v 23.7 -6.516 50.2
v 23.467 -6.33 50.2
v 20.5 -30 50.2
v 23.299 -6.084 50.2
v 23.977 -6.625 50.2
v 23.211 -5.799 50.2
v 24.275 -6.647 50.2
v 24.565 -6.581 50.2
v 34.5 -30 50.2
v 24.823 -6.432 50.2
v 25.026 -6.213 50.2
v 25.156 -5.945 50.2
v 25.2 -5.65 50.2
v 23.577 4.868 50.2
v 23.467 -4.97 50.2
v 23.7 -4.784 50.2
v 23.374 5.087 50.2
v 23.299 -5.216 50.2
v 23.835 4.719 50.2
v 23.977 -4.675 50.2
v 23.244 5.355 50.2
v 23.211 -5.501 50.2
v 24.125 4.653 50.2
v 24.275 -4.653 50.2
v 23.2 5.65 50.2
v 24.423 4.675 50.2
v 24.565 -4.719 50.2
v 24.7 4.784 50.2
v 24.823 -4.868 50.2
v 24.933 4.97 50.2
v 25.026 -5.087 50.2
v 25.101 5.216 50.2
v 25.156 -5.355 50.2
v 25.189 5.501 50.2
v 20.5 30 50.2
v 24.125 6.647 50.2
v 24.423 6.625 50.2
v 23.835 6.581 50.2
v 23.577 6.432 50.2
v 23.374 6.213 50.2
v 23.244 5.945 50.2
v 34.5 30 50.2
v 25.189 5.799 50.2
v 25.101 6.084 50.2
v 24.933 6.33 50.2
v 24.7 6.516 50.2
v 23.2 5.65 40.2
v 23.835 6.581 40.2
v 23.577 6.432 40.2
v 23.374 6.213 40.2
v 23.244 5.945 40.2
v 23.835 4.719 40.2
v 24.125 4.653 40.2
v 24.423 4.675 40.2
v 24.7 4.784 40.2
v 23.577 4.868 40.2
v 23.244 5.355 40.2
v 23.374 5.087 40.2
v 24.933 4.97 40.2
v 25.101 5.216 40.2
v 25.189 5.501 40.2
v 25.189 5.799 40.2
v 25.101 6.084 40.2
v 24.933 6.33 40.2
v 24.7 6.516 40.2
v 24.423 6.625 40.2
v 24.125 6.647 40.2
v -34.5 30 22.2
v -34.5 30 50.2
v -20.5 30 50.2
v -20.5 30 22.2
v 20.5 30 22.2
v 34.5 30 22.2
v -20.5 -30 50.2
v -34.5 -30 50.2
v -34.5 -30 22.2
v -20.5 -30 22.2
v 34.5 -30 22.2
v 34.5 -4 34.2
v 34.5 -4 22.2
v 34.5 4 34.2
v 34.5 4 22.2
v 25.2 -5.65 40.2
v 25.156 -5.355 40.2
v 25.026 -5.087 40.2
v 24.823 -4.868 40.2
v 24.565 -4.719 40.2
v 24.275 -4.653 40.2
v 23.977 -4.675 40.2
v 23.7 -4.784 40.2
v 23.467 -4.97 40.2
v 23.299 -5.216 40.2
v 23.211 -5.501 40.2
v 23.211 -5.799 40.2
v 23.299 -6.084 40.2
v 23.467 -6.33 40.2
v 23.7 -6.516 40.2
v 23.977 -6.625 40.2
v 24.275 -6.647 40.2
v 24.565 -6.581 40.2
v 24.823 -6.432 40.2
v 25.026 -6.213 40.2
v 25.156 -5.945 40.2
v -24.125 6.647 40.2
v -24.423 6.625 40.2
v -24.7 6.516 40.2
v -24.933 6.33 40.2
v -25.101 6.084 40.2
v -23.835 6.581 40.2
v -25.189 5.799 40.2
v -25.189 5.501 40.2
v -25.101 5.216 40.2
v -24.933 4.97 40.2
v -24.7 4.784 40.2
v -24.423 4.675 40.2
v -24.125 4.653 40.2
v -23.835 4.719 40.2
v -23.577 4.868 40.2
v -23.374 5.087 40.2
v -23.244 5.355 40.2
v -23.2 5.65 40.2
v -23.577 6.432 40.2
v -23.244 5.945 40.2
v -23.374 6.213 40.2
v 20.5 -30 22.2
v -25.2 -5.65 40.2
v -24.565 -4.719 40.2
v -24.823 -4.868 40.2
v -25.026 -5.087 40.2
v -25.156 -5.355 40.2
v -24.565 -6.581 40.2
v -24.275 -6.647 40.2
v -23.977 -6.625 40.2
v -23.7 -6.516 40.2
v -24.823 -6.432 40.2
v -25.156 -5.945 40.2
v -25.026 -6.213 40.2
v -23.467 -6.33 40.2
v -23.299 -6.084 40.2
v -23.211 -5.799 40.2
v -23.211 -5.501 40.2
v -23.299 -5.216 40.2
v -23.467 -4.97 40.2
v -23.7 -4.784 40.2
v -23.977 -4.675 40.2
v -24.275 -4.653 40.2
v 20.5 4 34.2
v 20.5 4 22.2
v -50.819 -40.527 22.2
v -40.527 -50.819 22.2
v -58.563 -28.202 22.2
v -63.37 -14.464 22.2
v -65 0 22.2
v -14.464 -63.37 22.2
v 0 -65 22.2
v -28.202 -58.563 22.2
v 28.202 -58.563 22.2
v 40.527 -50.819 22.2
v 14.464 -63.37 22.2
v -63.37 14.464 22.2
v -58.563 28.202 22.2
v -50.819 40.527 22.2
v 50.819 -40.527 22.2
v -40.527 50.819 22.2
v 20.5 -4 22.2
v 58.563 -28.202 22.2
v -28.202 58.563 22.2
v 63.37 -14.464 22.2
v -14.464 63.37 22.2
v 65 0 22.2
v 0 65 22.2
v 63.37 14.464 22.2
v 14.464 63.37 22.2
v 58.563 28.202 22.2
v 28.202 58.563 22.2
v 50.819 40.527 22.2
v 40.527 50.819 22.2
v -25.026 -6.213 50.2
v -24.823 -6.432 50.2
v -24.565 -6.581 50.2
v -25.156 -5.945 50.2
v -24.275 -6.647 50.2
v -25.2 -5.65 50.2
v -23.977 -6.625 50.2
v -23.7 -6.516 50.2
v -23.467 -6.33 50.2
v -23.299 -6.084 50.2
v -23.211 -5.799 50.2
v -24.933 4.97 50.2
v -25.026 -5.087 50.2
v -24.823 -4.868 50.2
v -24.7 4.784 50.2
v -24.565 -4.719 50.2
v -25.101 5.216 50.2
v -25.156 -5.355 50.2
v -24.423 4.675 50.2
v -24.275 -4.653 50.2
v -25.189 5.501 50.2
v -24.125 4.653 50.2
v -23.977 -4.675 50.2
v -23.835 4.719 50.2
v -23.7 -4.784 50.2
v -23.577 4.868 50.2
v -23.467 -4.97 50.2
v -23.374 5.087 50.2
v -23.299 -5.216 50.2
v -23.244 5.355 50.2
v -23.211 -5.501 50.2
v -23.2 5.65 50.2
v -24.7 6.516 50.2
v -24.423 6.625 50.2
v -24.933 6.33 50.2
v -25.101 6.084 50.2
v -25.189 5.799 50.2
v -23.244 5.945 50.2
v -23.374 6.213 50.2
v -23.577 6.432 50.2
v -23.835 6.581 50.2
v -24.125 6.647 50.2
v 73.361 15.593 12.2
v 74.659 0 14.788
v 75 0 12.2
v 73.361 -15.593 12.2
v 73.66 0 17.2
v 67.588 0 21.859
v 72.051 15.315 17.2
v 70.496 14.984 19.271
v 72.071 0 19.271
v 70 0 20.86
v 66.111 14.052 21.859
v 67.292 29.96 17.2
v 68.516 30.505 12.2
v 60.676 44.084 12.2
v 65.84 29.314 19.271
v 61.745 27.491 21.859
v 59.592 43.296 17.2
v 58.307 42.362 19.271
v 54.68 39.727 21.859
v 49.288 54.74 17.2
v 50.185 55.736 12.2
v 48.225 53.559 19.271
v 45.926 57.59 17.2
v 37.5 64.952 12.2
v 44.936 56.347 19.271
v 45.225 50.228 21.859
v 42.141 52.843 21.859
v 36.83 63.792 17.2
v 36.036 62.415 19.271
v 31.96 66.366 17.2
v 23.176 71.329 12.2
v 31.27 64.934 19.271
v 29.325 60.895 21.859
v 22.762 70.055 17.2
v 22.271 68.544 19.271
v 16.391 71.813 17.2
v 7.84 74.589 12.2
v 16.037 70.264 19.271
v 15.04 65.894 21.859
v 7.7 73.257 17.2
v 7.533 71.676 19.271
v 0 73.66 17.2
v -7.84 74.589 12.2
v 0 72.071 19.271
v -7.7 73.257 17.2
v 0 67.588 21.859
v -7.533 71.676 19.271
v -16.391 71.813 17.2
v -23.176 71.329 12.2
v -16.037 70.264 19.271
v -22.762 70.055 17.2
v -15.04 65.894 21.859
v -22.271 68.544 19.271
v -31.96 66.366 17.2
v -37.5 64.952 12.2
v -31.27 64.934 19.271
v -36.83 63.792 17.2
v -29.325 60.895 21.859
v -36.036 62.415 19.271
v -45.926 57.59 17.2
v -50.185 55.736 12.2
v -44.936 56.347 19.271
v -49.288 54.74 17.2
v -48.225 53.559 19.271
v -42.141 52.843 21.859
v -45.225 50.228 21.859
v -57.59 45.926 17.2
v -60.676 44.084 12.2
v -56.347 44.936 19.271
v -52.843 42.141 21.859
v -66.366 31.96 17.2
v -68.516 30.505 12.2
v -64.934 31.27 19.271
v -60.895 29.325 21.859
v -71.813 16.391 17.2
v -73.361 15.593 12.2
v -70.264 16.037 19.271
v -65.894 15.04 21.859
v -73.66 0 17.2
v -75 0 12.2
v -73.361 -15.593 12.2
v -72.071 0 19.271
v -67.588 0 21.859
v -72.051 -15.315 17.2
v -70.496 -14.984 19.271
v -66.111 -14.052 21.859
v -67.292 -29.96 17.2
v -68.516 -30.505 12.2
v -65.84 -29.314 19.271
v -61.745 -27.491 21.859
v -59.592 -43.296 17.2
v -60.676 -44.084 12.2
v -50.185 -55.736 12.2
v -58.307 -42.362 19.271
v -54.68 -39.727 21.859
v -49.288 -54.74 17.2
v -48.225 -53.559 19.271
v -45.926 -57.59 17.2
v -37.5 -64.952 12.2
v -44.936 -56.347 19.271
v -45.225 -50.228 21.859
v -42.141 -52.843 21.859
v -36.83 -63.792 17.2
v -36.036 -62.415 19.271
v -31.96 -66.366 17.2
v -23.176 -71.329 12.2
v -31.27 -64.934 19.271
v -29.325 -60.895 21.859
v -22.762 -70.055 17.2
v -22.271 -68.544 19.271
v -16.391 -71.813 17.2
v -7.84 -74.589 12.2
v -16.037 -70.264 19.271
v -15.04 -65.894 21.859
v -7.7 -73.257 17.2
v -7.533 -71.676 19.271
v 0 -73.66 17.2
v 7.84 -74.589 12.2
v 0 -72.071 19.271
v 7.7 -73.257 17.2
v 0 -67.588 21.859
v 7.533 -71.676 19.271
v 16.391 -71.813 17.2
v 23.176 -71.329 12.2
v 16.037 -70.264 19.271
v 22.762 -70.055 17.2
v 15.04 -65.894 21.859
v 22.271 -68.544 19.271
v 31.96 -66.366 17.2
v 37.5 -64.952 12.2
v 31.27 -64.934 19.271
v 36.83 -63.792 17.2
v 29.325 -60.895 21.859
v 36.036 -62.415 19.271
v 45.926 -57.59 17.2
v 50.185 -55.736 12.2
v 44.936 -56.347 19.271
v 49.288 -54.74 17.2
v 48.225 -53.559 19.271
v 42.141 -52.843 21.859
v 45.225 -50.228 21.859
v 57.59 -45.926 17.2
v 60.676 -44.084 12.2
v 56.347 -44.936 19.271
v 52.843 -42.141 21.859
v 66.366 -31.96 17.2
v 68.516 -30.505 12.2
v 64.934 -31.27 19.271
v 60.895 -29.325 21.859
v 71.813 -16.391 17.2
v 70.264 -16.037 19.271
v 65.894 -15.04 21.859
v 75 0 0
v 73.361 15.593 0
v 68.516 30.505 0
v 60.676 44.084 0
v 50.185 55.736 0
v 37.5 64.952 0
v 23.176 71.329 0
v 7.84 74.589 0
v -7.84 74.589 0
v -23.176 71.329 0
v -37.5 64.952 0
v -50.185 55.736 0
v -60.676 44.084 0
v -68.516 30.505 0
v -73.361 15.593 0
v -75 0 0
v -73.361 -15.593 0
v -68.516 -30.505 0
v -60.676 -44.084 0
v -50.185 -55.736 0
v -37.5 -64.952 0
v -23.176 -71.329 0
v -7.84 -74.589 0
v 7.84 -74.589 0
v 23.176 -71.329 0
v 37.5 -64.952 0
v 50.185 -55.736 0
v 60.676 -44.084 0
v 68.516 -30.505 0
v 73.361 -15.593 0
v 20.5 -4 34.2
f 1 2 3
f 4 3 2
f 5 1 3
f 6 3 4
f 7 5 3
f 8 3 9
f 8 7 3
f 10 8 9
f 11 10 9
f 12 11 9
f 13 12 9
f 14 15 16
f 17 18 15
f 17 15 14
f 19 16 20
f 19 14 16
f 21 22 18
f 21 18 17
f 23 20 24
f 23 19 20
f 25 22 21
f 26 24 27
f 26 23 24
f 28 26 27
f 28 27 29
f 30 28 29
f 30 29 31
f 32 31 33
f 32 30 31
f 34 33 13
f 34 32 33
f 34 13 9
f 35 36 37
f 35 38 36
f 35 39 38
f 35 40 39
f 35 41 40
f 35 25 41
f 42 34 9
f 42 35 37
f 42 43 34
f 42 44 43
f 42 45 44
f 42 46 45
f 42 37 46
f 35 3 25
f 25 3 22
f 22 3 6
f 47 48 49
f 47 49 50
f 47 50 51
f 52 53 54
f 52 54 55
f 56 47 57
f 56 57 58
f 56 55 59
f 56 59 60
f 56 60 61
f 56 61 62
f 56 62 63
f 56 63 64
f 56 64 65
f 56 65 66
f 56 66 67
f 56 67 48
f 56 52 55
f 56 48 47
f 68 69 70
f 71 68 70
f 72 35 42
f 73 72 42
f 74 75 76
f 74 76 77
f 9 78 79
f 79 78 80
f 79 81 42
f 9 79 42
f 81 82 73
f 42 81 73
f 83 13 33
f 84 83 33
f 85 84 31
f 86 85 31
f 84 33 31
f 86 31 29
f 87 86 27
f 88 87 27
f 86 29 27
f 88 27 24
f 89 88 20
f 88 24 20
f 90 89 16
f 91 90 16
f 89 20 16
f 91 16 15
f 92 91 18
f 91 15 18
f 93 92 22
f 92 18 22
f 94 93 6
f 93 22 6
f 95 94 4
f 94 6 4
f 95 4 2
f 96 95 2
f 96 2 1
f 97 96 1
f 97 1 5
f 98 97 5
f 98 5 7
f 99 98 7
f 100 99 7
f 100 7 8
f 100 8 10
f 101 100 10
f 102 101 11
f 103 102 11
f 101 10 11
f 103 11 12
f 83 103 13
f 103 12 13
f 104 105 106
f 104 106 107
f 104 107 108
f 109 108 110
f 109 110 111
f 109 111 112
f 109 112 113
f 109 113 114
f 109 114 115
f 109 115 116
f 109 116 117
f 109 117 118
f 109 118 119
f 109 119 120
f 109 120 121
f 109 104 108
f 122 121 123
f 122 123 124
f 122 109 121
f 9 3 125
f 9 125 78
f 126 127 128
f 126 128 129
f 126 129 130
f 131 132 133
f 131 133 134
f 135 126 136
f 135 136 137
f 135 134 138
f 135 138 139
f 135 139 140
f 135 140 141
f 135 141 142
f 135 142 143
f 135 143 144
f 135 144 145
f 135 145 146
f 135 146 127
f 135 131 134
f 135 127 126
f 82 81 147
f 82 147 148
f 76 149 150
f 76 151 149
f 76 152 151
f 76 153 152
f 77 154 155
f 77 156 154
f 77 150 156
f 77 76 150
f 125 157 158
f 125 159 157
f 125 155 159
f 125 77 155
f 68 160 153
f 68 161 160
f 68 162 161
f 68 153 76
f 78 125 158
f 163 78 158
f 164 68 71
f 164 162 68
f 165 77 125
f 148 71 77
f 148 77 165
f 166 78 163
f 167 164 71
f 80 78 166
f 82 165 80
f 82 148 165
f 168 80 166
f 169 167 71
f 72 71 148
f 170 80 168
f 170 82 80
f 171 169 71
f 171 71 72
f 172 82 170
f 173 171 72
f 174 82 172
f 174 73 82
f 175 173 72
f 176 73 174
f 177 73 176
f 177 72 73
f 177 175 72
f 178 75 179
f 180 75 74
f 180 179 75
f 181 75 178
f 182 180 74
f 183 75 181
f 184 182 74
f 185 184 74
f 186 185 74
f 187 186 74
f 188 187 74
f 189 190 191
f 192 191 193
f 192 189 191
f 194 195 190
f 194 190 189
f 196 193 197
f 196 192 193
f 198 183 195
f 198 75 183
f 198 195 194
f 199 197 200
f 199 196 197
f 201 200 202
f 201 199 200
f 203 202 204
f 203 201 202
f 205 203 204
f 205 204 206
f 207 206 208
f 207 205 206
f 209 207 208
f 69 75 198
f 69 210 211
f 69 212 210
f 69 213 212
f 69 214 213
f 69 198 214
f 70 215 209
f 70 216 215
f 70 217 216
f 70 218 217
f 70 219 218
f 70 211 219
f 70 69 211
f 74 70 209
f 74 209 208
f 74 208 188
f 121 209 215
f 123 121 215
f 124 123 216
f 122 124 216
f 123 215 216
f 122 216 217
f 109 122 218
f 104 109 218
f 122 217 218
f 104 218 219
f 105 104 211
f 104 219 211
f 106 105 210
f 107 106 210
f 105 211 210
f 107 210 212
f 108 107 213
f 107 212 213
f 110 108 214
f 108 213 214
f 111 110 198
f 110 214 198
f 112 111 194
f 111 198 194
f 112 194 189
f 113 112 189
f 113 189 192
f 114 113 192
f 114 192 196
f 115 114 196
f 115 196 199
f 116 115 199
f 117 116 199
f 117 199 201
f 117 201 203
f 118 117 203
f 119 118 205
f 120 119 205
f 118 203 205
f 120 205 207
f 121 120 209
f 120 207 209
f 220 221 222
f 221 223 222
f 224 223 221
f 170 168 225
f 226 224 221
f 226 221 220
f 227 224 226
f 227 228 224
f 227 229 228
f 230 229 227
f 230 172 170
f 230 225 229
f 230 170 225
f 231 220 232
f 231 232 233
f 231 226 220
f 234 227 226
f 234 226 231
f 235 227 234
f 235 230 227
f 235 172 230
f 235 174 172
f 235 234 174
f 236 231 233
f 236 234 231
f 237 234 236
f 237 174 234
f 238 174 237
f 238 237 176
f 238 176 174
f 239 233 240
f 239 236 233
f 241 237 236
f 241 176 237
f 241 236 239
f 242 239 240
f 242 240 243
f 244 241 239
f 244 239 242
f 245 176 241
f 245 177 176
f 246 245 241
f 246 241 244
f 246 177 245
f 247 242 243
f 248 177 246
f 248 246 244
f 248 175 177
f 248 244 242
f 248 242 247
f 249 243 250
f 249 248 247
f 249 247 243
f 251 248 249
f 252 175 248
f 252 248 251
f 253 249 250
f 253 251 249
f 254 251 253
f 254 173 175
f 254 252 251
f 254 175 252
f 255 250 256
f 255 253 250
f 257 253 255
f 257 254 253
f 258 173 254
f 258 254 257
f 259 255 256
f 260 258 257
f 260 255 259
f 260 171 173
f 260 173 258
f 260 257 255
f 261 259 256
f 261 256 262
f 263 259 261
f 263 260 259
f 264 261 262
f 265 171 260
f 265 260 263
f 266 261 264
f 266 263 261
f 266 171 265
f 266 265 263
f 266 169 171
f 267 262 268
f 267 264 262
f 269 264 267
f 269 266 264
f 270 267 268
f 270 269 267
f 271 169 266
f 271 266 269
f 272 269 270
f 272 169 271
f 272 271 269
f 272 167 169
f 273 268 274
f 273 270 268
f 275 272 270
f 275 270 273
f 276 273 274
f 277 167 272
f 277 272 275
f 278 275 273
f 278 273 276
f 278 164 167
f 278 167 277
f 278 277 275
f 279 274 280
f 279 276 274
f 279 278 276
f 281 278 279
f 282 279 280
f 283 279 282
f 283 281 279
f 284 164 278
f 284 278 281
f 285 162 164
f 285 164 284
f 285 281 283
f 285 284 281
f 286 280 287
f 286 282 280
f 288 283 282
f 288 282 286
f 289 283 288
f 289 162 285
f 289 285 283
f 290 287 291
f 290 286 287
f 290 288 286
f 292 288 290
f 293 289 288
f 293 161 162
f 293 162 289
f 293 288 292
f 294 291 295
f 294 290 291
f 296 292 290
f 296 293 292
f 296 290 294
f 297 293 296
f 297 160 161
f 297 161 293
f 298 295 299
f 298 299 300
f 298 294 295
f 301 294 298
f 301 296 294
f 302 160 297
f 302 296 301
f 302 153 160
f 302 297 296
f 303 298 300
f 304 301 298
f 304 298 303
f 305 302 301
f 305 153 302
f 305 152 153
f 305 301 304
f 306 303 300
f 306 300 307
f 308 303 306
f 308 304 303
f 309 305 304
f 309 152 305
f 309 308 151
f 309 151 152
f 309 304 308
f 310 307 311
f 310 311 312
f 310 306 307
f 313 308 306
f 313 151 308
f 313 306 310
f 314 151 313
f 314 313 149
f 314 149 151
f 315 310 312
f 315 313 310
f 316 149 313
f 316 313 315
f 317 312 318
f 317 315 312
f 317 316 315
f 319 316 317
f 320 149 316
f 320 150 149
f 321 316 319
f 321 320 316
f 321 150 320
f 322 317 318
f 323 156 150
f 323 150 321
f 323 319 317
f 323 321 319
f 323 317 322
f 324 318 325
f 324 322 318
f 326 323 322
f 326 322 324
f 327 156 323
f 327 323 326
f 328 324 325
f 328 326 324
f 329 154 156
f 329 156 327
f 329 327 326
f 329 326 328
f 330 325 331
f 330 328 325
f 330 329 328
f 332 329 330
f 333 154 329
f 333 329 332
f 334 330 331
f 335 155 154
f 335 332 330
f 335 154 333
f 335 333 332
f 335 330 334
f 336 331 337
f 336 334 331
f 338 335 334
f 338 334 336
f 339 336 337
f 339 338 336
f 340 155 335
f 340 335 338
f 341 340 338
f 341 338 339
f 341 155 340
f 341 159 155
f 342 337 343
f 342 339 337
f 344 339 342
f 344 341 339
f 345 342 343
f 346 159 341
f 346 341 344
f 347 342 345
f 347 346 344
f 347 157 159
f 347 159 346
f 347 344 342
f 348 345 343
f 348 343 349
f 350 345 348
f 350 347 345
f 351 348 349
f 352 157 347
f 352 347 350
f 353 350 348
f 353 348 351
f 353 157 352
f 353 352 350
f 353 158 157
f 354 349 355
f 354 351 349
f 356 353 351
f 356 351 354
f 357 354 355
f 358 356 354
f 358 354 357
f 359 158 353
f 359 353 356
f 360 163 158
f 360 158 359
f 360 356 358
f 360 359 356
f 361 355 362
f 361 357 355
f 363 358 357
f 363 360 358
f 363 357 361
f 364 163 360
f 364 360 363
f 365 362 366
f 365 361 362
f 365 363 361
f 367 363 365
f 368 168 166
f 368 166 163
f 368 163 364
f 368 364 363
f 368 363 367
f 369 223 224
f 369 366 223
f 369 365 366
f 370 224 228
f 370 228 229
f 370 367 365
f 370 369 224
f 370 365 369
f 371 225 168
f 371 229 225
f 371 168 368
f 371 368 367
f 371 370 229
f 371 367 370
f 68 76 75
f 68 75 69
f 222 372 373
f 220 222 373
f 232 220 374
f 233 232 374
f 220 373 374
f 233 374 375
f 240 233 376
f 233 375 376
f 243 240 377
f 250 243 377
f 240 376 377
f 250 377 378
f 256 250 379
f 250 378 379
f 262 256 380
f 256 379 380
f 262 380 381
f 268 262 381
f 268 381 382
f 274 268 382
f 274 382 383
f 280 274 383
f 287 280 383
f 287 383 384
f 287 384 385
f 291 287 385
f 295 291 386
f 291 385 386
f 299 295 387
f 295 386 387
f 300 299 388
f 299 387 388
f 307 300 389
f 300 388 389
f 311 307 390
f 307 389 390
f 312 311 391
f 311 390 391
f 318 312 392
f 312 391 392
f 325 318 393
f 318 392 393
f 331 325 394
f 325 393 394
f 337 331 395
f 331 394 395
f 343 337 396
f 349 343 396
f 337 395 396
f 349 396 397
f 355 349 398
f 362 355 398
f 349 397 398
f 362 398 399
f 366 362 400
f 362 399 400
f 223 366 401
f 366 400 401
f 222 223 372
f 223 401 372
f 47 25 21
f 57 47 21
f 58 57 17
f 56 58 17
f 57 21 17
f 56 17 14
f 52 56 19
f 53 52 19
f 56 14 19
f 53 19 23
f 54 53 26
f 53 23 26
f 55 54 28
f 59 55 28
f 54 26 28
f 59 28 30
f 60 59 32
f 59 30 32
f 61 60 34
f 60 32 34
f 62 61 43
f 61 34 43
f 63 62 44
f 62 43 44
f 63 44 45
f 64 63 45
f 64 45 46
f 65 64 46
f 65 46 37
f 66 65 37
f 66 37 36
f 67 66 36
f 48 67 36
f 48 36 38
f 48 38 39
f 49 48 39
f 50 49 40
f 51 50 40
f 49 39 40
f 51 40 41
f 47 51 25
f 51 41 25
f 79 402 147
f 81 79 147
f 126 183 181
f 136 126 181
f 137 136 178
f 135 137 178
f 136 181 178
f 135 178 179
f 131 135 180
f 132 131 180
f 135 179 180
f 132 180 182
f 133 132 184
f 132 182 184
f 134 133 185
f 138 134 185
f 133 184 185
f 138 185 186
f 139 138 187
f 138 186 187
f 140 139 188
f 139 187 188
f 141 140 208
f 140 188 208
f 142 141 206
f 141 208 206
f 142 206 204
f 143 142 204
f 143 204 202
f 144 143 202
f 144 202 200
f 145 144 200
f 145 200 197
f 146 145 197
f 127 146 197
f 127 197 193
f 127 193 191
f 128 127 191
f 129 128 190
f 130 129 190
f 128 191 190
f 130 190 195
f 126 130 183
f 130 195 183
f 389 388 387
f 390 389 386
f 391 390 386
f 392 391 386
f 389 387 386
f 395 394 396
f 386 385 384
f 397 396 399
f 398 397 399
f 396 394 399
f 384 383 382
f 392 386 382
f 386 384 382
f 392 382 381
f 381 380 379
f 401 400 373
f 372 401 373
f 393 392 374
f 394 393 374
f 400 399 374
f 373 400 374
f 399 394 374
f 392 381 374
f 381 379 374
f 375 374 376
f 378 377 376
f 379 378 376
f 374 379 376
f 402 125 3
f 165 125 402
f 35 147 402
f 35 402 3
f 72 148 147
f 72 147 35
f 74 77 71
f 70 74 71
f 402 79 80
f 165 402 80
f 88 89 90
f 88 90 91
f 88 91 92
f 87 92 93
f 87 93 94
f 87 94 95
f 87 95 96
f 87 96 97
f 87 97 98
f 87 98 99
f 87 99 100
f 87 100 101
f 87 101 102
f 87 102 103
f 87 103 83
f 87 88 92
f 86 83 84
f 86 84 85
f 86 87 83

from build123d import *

# Parameters (mm, degrees)
ESQUISSE1_R               = 75
BOSS_EXTRU_1_DEPTH        = 22.2
CONG_1_R                  = 10
ESQUISSE2_W               = 14
ESQUISSE2_H               = 60
BOSS_EXTRU_2_DEPTH        = 28
ESQUISSE3_R               = 1
ENL_V_MAT_EXTRU_1_DEPTH   = 10
ESQUISSE5_W               = 12
ESQUISSE5_H               = 8
PASSAGE_CABLE_MG995_DEPTH = 118.34581373


with BuildPart() as part:
    # Esquisse1 → Boss.-Extru.1 (new body)
    with BuildSketch(Plane.XY):
        Circle(ESQUISSE1_R)
    extrude(amount=BOSS_EXTRU_1_DEPTH)

    # Congé1
    cong_1_edges = [part.edges().sort_by_distance(p)[0] for p in [
        (-75, 0, 22.2),
    ]]
    fillet(cong_1_edges, radius=CONG_1_R)

    # Esquisse2 → Boss.-Extru.2 (add)
    with BuildSketch(Plane.XY.offset(22.2)):
        with Locations((-27.5, 0)):
            Rectangle(ESQUISSE2_W, ESQUISSE2_H)
        with Locations((27.5, 0)):
            Rectangle(ESQUISSE2_W, ESQUISSE2_H)
    extrude(amount=BOSS_EXTRU_2_DEPTH)

    # Esquisse3 → Enlèv. mat.-Extru.1 (cut)
    with BuildSketch(Plane.XY.offset(50.2)):
        with Locations((-24.2, 5.65)):
            Circle(ESQUISSE3_R)
        with Locations(Location((-24.2, -5.65, 0), (0, 0, 180))):
            Circle(ESQUISSE3_R)
        with Locations((24.2, -5.65)):
            Circle(ESQUISSE3_R)
        with Locations(Location((24.2, 5.65, 0), (0, 0, 180))):
            Circle(ESQUISSE3_R)
    extrude(amount=-ENL_V_MAT_EXTRU_1_DEPTH, mode=Mode.SUBTRACT)

    # Esquisse5 → Passage cable MG995 (cut, through all)
    with BuildSketch(Plane(origin=(0, 0, 0), x_dir=(0, 0, -1), z_dir=(1, 0, 0))):
        with Locations((-28.2, 0)):
            Rectangle(ESQUISSE5_W, ESQUISSE5_H)
    extrude(amount=PASSAGE_CABLE_MG995_DEPTH, mode=Mode.SUBTRACT)


solid = part.part
